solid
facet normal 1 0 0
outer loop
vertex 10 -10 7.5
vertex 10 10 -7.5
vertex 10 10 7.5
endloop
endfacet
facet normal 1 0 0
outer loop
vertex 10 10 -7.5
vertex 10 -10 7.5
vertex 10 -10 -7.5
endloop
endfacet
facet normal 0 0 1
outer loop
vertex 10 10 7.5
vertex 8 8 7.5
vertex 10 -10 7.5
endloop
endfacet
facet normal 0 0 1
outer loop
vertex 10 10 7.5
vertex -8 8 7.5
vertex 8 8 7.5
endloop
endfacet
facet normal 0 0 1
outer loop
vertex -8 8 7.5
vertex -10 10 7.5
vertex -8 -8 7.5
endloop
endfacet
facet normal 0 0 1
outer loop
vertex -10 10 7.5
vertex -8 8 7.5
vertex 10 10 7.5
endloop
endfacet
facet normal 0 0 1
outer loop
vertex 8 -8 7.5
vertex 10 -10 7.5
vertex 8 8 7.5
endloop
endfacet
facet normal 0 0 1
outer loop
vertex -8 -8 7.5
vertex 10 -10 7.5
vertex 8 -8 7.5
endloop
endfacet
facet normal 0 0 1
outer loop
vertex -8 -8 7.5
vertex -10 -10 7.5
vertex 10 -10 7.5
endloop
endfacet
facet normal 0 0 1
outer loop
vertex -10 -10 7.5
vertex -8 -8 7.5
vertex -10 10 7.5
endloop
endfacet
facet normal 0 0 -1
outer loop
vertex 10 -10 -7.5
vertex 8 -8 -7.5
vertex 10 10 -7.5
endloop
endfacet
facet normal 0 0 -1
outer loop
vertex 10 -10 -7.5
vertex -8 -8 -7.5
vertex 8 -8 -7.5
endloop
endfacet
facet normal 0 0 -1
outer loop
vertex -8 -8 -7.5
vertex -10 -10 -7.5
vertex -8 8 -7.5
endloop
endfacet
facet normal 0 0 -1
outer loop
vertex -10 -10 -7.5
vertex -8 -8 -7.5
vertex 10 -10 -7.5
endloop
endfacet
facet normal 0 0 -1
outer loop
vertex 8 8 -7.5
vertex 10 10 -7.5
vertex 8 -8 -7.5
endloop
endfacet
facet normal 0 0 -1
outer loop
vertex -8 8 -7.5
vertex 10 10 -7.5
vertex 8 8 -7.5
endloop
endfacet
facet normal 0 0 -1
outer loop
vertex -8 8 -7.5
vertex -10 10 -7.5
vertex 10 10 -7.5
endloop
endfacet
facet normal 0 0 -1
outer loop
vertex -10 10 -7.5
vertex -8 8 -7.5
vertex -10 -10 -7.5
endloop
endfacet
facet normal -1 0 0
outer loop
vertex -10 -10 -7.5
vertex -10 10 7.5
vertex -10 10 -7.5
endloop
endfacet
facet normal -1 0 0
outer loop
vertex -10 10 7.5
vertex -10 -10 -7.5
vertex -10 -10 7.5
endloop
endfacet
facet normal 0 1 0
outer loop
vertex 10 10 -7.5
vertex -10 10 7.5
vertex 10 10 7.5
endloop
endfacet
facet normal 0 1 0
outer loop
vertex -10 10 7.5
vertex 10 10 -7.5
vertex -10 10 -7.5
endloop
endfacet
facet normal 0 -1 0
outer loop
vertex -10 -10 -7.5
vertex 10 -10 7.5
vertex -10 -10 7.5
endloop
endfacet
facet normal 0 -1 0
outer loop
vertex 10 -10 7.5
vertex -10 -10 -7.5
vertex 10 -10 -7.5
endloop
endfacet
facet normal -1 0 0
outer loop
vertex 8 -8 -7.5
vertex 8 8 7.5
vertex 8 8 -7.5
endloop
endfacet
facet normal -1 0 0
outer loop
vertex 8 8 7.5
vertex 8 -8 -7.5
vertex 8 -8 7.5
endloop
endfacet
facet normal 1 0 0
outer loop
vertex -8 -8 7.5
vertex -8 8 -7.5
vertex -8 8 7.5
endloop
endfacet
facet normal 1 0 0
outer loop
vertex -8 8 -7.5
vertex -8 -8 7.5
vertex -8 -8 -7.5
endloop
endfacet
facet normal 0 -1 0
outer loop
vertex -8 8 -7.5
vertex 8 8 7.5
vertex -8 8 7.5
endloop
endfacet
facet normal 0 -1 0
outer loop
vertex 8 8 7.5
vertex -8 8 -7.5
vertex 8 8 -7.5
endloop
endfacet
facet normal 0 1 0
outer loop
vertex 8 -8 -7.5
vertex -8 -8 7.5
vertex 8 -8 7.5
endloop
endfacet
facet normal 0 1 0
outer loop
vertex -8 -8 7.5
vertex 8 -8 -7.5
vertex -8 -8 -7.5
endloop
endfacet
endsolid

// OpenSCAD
difference(){
cube([20,20,15],center=true);
cube([16,16,50],center=true);
}
